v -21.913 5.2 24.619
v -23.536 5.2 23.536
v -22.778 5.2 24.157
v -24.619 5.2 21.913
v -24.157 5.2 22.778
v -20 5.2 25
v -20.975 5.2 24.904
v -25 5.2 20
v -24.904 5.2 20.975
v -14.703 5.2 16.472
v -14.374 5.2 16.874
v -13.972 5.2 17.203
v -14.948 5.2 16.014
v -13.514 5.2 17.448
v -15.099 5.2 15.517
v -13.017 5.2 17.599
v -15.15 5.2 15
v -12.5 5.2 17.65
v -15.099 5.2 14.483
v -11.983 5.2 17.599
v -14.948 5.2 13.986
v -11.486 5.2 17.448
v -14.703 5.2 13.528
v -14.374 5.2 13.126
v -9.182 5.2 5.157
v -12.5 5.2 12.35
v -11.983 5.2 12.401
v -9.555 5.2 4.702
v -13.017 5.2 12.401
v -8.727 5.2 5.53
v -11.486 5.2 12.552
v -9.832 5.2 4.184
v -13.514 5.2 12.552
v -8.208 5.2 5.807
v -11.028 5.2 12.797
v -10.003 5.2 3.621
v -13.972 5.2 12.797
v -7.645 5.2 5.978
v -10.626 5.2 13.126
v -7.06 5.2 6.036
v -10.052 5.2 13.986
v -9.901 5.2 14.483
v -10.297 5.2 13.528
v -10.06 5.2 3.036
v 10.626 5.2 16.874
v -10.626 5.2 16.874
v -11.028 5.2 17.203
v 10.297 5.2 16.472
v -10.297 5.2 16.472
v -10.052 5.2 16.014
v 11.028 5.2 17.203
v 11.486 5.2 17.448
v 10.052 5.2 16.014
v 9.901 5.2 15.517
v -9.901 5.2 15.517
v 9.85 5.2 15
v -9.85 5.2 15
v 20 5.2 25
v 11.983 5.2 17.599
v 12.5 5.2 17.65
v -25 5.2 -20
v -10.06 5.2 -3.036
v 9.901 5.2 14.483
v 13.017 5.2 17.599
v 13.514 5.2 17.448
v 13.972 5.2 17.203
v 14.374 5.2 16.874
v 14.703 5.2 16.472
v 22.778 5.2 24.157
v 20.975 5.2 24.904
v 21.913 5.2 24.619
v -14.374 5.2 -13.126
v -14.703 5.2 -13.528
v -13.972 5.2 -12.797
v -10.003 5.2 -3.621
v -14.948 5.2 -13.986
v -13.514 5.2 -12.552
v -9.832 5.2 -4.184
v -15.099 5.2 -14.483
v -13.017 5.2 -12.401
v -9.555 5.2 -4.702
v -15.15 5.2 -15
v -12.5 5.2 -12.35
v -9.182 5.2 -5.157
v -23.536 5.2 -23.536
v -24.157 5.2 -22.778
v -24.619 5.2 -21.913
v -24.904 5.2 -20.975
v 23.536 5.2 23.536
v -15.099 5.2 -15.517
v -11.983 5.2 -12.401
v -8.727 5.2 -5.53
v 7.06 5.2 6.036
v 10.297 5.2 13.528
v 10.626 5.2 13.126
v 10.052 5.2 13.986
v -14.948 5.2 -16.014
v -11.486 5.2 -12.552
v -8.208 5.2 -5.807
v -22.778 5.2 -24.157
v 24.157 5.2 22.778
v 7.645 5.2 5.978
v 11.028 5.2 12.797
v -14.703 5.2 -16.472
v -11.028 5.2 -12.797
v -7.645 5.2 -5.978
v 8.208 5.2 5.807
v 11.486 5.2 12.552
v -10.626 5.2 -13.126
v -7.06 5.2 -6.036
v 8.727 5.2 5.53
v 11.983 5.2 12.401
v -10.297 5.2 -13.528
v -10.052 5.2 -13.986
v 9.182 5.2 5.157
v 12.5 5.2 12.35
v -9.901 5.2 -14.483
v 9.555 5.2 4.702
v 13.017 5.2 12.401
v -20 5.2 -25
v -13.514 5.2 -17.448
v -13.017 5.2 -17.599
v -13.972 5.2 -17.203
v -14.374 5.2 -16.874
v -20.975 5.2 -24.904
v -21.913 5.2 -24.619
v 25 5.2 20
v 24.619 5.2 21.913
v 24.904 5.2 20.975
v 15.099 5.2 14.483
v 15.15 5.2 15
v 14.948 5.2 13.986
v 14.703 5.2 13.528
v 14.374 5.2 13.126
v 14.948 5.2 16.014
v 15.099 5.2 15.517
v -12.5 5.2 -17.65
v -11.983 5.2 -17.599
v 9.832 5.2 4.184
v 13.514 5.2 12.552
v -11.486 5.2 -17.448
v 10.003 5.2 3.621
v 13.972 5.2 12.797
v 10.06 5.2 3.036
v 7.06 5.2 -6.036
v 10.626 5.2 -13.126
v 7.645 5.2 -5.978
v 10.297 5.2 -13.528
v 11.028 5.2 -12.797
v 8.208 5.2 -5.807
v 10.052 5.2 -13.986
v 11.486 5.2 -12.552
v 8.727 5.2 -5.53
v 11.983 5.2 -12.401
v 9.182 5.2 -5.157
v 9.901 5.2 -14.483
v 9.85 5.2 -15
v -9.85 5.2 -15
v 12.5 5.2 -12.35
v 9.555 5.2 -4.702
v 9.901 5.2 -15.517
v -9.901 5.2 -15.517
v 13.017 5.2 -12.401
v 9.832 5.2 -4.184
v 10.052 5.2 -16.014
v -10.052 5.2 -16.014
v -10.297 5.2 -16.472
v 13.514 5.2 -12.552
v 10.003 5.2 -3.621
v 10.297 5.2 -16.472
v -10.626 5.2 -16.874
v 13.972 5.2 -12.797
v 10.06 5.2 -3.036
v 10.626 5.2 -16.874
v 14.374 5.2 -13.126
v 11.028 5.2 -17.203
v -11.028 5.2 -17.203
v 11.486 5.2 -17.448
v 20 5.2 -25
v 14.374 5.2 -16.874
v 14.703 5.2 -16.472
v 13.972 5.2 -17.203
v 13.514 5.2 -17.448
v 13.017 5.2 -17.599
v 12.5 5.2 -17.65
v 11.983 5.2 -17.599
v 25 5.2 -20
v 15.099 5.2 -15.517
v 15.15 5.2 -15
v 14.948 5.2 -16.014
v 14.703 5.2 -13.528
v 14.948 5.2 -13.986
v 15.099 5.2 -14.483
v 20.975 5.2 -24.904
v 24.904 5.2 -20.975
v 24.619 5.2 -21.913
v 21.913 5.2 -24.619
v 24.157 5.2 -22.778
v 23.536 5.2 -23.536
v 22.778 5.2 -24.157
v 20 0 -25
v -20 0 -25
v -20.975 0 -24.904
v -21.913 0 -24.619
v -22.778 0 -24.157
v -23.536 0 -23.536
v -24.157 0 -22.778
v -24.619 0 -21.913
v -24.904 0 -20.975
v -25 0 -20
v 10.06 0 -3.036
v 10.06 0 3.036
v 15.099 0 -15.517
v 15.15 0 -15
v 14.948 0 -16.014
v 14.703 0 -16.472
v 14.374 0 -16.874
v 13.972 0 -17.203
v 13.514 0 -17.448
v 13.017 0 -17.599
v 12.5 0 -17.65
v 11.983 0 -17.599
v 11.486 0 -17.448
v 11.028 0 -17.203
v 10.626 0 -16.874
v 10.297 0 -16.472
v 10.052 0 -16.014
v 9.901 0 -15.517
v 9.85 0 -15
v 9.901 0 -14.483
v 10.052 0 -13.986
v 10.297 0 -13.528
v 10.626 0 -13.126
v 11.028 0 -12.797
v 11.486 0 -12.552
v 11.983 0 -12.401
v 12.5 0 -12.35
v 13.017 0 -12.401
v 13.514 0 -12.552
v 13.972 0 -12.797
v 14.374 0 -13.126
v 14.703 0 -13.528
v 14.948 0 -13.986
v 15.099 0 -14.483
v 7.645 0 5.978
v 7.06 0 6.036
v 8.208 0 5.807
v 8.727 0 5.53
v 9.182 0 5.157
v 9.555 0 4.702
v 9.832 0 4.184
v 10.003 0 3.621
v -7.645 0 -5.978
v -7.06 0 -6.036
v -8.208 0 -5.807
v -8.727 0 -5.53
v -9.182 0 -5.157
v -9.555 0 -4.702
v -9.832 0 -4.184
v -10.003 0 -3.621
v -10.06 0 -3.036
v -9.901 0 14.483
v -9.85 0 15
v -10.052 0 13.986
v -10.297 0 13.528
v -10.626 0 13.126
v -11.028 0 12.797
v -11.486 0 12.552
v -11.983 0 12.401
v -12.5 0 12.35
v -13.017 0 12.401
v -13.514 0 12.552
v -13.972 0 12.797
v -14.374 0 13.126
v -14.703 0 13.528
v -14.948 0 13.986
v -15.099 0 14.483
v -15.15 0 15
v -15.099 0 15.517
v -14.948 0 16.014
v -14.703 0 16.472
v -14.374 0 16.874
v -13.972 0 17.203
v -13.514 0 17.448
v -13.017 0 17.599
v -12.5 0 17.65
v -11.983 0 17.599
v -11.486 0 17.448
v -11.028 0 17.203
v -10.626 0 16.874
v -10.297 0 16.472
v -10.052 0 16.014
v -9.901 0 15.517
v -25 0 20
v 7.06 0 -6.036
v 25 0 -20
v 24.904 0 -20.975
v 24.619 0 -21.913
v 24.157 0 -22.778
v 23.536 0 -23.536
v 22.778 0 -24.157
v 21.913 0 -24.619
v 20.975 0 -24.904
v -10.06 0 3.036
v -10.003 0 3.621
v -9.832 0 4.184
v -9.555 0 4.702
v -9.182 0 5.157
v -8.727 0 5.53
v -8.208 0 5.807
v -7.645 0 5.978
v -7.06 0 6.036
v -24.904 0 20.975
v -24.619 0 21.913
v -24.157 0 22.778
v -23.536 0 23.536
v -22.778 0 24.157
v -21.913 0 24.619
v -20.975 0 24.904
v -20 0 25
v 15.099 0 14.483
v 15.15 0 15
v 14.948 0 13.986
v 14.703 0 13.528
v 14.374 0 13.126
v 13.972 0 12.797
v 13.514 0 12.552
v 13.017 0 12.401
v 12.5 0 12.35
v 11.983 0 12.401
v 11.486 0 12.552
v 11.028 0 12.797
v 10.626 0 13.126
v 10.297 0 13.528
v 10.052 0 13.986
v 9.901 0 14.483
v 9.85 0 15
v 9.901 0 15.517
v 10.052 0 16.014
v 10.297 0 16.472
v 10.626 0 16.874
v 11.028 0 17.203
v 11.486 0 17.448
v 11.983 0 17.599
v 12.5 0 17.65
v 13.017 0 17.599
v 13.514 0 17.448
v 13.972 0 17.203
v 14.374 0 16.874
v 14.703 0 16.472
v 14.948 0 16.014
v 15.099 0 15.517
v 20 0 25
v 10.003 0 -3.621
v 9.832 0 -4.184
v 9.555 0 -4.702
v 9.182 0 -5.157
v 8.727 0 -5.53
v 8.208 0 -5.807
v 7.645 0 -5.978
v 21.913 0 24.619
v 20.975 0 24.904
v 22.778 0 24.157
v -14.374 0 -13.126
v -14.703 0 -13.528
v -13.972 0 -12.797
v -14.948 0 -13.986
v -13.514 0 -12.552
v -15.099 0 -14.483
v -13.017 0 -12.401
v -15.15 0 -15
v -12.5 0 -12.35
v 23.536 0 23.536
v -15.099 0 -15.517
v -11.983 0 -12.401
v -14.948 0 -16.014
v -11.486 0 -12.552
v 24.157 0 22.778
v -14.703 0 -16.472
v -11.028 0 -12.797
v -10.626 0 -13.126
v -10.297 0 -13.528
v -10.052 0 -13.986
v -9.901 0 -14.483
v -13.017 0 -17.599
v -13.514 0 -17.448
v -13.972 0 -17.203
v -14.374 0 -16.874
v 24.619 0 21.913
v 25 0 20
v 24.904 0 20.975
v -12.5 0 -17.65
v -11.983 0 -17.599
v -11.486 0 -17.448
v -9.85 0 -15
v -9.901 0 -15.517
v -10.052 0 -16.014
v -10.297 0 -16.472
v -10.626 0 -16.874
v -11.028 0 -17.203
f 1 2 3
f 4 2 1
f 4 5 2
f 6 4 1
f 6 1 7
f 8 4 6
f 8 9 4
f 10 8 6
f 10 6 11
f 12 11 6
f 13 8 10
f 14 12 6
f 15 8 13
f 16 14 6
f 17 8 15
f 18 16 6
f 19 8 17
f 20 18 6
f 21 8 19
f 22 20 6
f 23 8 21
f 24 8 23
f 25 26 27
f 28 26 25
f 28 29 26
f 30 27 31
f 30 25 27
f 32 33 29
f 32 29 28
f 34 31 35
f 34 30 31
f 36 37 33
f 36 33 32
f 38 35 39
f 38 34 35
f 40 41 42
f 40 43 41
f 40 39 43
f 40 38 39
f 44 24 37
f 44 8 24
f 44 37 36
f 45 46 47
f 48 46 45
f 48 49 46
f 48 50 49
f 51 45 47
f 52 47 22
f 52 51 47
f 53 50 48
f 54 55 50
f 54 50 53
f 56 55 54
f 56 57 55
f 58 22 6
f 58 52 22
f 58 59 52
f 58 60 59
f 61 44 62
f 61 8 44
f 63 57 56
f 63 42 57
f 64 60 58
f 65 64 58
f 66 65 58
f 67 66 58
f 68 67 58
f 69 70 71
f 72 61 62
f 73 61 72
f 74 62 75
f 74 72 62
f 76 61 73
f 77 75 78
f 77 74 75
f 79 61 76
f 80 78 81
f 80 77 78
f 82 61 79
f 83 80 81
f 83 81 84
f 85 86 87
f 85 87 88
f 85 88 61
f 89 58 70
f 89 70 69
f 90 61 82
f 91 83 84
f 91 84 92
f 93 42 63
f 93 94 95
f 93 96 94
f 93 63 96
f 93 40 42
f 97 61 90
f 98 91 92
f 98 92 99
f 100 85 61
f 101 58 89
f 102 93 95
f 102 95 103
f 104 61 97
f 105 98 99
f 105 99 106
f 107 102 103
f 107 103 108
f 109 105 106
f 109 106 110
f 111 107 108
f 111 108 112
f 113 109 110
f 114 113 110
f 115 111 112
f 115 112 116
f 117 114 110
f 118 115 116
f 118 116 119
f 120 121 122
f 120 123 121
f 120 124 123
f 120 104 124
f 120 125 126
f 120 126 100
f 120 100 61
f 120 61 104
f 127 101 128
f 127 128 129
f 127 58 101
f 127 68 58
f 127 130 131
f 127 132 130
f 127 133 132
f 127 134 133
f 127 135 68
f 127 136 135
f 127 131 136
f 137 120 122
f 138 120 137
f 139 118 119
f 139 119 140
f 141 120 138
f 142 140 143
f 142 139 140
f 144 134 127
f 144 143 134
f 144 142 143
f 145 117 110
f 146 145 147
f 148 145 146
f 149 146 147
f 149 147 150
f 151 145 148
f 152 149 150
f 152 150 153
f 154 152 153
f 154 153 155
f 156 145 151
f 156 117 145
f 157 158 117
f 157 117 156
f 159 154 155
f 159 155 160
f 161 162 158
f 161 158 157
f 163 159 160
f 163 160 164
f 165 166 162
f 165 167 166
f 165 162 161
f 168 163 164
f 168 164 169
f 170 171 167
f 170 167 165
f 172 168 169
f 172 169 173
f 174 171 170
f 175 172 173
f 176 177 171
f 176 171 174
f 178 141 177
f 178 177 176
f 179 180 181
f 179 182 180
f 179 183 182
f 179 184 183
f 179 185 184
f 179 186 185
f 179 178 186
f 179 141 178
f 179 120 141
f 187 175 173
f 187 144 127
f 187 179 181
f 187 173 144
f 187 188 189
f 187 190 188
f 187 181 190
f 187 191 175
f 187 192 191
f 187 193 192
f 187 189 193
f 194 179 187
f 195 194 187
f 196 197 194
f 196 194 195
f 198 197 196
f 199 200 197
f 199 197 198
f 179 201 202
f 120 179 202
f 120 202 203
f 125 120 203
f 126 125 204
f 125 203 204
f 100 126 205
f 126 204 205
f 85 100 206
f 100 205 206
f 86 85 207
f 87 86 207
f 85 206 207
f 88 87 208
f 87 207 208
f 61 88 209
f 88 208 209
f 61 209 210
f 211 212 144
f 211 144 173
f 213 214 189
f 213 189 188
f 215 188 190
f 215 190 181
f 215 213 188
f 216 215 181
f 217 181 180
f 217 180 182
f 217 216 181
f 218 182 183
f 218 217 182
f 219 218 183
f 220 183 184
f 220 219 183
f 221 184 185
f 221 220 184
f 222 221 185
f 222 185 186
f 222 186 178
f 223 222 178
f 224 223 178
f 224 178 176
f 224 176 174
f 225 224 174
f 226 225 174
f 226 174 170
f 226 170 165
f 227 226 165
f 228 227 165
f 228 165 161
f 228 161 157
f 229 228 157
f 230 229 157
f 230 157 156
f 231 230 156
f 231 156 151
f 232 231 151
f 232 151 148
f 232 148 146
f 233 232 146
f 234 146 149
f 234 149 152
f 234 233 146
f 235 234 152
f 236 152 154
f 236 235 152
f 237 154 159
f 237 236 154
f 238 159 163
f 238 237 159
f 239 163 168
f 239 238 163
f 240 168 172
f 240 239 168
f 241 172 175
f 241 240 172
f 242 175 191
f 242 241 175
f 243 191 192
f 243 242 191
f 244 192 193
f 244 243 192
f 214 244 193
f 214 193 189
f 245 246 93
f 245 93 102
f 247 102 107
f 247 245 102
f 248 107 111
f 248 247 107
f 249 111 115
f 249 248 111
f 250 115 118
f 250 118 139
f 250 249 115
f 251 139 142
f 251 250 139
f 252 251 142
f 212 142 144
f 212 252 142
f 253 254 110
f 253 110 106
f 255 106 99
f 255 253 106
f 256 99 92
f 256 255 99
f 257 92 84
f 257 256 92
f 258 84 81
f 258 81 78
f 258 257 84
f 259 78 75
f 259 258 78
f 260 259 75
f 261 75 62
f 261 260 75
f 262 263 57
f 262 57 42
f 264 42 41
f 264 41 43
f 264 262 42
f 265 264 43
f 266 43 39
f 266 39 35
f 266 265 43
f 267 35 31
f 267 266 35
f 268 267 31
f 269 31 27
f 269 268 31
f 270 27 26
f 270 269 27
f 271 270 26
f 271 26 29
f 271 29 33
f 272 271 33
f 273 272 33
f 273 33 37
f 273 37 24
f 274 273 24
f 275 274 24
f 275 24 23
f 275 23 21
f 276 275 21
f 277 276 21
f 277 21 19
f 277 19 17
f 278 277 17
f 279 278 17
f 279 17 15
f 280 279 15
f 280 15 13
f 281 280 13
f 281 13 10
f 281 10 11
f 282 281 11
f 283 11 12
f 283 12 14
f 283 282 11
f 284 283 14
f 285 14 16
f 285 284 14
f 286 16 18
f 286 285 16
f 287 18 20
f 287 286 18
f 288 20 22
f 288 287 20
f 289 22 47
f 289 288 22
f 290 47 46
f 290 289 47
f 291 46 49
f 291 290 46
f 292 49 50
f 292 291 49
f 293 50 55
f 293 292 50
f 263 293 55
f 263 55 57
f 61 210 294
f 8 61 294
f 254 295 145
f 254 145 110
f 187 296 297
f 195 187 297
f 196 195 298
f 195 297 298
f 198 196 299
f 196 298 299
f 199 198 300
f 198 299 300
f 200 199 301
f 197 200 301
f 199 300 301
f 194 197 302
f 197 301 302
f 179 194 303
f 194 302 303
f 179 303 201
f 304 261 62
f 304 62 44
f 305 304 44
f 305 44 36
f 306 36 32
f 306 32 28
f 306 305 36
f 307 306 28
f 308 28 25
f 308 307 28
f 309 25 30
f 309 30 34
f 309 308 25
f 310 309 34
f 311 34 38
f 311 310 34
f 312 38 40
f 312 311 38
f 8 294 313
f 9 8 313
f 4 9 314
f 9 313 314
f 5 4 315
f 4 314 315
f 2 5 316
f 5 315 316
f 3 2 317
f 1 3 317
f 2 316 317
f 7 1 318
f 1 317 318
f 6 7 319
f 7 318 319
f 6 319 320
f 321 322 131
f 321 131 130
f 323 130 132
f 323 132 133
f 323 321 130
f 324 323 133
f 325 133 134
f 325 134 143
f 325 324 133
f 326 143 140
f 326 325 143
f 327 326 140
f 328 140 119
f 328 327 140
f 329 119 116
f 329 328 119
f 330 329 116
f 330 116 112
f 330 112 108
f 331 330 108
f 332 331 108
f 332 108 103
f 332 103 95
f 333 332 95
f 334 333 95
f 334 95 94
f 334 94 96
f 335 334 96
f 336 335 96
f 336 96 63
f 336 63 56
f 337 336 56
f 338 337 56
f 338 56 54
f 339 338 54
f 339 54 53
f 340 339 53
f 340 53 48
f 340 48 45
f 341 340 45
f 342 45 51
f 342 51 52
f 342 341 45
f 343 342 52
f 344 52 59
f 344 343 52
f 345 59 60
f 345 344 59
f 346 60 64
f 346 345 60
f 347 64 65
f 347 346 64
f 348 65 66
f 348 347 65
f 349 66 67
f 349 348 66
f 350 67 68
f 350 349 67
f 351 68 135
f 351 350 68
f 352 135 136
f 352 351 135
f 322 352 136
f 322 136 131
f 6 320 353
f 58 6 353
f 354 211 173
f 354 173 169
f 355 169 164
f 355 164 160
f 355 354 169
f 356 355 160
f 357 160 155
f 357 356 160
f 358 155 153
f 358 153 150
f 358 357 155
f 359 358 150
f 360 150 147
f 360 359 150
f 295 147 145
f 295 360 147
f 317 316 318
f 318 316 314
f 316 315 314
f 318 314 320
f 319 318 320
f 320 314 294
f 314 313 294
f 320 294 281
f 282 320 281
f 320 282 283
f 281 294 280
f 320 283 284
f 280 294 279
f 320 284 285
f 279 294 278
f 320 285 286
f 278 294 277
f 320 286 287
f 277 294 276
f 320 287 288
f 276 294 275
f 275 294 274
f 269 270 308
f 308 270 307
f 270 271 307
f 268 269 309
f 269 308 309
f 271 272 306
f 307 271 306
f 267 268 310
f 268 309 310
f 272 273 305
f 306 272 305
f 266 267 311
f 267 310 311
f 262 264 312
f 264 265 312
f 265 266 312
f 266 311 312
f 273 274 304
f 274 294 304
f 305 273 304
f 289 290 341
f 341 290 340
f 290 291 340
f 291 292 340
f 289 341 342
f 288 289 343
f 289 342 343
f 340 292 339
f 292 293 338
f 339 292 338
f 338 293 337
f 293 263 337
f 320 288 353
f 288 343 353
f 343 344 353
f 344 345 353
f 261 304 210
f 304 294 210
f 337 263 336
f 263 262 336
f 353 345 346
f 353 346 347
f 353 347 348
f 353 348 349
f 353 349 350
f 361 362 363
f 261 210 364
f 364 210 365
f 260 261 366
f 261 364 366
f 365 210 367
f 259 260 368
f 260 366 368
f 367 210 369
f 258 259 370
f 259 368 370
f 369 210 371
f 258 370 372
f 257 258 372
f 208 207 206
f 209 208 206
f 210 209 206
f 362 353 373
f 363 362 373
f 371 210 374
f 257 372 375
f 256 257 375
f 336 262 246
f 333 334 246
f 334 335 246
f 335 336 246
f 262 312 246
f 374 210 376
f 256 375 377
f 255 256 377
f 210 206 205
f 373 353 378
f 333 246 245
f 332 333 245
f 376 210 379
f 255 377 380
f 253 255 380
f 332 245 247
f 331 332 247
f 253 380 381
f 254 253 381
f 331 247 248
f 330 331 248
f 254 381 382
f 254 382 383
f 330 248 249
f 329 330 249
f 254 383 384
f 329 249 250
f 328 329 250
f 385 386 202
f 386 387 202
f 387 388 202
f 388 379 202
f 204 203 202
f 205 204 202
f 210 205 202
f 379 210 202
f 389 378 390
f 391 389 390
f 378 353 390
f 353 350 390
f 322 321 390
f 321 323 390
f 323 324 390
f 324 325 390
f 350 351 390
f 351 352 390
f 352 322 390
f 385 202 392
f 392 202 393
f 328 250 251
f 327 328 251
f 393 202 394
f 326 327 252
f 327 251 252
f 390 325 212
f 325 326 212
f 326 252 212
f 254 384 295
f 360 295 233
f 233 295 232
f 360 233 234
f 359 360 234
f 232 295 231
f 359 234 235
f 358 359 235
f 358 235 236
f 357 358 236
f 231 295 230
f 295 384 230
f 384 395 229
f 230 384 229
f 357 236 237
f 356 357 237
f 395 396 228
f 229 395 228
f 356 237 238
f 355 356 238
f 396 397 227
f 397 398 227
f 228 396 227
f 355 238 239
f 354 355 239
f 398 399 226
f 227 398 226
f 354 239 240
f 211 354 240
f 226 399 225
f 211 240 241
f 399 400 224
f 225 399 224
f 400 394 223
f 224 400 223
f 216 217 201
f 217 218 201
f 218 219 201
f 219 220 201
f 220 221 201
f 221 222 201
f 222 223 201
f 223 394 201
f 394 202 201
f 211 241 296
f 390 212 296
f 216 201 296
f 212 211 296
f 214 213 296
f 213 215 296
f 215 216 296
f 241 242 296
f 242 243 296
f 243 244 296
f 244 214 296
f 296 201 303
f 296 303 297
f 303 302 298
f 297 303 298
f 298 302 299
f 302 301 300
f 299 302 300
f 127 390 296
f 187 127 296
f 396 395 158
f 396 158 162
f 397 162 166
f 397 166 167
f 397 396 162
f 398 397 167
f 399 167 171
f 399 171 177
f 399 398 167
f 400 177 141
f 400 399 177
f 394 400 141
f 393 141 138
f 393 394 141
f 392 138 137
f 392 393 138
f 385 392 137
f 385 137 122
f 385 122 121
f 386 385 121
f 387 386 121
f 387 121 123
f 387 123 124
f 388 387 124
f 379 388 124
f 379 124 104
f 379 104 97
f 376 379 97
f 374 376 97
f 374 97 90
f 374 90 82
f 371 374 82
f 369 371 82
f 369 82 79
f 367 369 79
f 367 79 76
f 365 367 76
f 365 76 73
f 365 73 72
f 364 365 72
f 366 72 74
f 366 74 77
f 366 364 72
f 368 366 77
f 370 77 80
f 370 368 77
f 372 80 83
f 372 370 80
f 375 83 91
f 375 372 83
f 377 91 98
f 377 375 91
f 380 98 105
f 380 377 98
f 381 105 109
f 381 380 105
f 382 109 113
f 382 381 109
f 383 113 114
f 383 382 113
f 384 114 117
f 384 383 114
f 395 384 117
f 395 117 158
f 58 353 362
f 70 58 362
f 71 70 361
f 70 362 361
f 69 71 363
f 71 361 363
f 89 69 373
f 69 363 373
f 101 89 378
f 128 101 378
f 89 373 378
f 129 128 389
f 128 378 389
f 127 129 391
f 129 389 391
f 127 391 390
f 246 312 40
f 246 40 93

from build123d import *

# Parameters (mm, degrees)
CROQUIS1_R              = 2.65
SALIENTE_EXTRUIR2_DEPTH = 8
CORTAR_EXTRUIR1_START   = 8
CROQUIS1_4_R            = 2.65
CORTAR_EXTRUIR1_DEPTH   = 2.8


with BuildPart() as part:
    # Croquis1 → Saliente-Extruir2 (new body)
    with BuildSketch(Plane(origin=(0, 0, 0), x_dir=(1, 0, 0), z_dir=(0, 1, 0))):
        with BuildLine():
            Line((-20, -25), (20, -25))
            ThreePointArc((20, -25), (23.535533906, -23.535533906), (25, -20))
            Line((25, -20), (25, 20))
            ThreePointArc((25, 20), (23.535533906, 23.535533906), (20, 25))
            Line((20, 25), (-20, 25))
            ThreePointArc((-20, 25), (-23.535533906, 23.535533906), (-25, 20))
            Line((-25, 20), (-25, -20))
            ThreePointArc((-25, -20), (-23.535533906, -23.535533906), (-20, -25))
        make_face()
        with Locations((-12.5, -15)):
            Circle(CROQUIS1_R, mode=Mode.SUBTRACT)
        with Locations((-12.5, 15)):
            Circle(CROQUIS1_R, mode=Mode.SUBTRACT)
        with Locations((12.5, -15)):
            Circle(CROQUIS1_R, mode=Mode.SUBTRACT)
        with Locations((12.5, 15)):
            Circle(CROQUIS1_R, mode=Mode.SUBTRACT)
        with BuildLine():
            Line((-7.060224725, -6.03567091), (7.060224725, -6.03567091))
            ThreePointArc((7.060224725, -6.03567091), (9.181545068, -5.156991253), (10.060224725, -3.03567091))
            Line((10.060224725, -3.03567091), (10.060224725, 3.03567091))
            ThreePointArc((10.060224725, 3.03567091), (9.181545068, 5.156991253), (7.060224725, 6.03567091))
            Line((7.060224725, 6.03567091), (-7.060224725, 6.03567091))
            ThreePointArc((-7.060224725, 6.03567091), (-9.181545068, 5.156991253), (-10.060224725, 3.03567091))
            Line((-10.060224725, 3.03567091), (-10.060224725, -3.03567091))
            ThreePointArc((-10.060224725, -3.03567091), (-9.181545068, -5.156991253), (-7.060224725, -6.03567091))
        make_face(mode=Mode.SUBTRACT)
    extrude(amount=SALIENTE_EXTRUIR2_DEPTH)

    # Croquis1<4> → Cortar-Extruir1 (cut)
    with BuildSketch(Plane(origin=(0, 0, 0), x_dir=(1, 0, 0), z_dir=(0, 1, 0)).offset(CORTAR_EXTRUIR1_START)):
        with BuildLine():
            Line((-20, -25), (20, -25))
            ThreePointArc((20, -25), (23.535533906, -23.535533906), (25, -20))
            Line((25, -20), (25, 20))
            ThreePointArc((25, 20), (23.535533906, 23.535533906), (20, 25))
            Line((20, 25), (-20, 25))
            ThreePointArc((-20, 25), (-23.535533906, 23.535533906), (-25, 20))
            Line((-25, 20), (-25, -20))
            ThreePointArc((-25, -20), (-23.535533906, -23.535533906), (-20, -25))
        make_face()
        with Locations((-12.5, -15)):
            Circle(CROQUIS1_4_R, mode=Mode.SUBTRACT)
        with Locations((-12.5, 15)):
            Circle(CROQUIS1_4_R, mode=Mode.SUBTRACT)
        with Locations((12.5, -15)):
            Circle(CROQUIS1_4_R, mode=Mode.SUBTRACT)
        with Locations((12.5, 15)):
            Circle(CROQUIS1_4_R, mode=Mode.SUBTRACT)
        with BuildLine():
            Line((-7.060224725, -6.03567091), (7.060224725, -6.03567091))
            ThreePointArc((7.060224725, -6.03567091), (9.181545068, -5.156991253), (10.060224725, -3.03567091))
            Line((10.060224725, -3.03567091), (10.060224725, 3.03567091))
            ThreePointArc((10.060224725, 3.03567091), (9.181545068, 5.156991253), (7.060224725, 6.03567091))
            Line((7.060224725, 6.03567091), (-7.060224725, 6.03567091))
            ThreePointArc((-7.060224725, 6.03567091), (-9.181545068, 5.156991253), (-10.060224725, 3.03567091))
            Line((-10.060224725, 3.03567091), (-10.060224725, -3.03567091))
            ThreePointArc((-10.060224725, -3.03567091), (-9.181545068, -5.156991253), (-7.060224725, -6.03567091))
        make_face(mode=Mode.SUBTRACT)
    extrude(amount=-CORTAR_EXTRUIR1_DEPTH, mode=Mode.SUBTRACT)


solid = part.part
